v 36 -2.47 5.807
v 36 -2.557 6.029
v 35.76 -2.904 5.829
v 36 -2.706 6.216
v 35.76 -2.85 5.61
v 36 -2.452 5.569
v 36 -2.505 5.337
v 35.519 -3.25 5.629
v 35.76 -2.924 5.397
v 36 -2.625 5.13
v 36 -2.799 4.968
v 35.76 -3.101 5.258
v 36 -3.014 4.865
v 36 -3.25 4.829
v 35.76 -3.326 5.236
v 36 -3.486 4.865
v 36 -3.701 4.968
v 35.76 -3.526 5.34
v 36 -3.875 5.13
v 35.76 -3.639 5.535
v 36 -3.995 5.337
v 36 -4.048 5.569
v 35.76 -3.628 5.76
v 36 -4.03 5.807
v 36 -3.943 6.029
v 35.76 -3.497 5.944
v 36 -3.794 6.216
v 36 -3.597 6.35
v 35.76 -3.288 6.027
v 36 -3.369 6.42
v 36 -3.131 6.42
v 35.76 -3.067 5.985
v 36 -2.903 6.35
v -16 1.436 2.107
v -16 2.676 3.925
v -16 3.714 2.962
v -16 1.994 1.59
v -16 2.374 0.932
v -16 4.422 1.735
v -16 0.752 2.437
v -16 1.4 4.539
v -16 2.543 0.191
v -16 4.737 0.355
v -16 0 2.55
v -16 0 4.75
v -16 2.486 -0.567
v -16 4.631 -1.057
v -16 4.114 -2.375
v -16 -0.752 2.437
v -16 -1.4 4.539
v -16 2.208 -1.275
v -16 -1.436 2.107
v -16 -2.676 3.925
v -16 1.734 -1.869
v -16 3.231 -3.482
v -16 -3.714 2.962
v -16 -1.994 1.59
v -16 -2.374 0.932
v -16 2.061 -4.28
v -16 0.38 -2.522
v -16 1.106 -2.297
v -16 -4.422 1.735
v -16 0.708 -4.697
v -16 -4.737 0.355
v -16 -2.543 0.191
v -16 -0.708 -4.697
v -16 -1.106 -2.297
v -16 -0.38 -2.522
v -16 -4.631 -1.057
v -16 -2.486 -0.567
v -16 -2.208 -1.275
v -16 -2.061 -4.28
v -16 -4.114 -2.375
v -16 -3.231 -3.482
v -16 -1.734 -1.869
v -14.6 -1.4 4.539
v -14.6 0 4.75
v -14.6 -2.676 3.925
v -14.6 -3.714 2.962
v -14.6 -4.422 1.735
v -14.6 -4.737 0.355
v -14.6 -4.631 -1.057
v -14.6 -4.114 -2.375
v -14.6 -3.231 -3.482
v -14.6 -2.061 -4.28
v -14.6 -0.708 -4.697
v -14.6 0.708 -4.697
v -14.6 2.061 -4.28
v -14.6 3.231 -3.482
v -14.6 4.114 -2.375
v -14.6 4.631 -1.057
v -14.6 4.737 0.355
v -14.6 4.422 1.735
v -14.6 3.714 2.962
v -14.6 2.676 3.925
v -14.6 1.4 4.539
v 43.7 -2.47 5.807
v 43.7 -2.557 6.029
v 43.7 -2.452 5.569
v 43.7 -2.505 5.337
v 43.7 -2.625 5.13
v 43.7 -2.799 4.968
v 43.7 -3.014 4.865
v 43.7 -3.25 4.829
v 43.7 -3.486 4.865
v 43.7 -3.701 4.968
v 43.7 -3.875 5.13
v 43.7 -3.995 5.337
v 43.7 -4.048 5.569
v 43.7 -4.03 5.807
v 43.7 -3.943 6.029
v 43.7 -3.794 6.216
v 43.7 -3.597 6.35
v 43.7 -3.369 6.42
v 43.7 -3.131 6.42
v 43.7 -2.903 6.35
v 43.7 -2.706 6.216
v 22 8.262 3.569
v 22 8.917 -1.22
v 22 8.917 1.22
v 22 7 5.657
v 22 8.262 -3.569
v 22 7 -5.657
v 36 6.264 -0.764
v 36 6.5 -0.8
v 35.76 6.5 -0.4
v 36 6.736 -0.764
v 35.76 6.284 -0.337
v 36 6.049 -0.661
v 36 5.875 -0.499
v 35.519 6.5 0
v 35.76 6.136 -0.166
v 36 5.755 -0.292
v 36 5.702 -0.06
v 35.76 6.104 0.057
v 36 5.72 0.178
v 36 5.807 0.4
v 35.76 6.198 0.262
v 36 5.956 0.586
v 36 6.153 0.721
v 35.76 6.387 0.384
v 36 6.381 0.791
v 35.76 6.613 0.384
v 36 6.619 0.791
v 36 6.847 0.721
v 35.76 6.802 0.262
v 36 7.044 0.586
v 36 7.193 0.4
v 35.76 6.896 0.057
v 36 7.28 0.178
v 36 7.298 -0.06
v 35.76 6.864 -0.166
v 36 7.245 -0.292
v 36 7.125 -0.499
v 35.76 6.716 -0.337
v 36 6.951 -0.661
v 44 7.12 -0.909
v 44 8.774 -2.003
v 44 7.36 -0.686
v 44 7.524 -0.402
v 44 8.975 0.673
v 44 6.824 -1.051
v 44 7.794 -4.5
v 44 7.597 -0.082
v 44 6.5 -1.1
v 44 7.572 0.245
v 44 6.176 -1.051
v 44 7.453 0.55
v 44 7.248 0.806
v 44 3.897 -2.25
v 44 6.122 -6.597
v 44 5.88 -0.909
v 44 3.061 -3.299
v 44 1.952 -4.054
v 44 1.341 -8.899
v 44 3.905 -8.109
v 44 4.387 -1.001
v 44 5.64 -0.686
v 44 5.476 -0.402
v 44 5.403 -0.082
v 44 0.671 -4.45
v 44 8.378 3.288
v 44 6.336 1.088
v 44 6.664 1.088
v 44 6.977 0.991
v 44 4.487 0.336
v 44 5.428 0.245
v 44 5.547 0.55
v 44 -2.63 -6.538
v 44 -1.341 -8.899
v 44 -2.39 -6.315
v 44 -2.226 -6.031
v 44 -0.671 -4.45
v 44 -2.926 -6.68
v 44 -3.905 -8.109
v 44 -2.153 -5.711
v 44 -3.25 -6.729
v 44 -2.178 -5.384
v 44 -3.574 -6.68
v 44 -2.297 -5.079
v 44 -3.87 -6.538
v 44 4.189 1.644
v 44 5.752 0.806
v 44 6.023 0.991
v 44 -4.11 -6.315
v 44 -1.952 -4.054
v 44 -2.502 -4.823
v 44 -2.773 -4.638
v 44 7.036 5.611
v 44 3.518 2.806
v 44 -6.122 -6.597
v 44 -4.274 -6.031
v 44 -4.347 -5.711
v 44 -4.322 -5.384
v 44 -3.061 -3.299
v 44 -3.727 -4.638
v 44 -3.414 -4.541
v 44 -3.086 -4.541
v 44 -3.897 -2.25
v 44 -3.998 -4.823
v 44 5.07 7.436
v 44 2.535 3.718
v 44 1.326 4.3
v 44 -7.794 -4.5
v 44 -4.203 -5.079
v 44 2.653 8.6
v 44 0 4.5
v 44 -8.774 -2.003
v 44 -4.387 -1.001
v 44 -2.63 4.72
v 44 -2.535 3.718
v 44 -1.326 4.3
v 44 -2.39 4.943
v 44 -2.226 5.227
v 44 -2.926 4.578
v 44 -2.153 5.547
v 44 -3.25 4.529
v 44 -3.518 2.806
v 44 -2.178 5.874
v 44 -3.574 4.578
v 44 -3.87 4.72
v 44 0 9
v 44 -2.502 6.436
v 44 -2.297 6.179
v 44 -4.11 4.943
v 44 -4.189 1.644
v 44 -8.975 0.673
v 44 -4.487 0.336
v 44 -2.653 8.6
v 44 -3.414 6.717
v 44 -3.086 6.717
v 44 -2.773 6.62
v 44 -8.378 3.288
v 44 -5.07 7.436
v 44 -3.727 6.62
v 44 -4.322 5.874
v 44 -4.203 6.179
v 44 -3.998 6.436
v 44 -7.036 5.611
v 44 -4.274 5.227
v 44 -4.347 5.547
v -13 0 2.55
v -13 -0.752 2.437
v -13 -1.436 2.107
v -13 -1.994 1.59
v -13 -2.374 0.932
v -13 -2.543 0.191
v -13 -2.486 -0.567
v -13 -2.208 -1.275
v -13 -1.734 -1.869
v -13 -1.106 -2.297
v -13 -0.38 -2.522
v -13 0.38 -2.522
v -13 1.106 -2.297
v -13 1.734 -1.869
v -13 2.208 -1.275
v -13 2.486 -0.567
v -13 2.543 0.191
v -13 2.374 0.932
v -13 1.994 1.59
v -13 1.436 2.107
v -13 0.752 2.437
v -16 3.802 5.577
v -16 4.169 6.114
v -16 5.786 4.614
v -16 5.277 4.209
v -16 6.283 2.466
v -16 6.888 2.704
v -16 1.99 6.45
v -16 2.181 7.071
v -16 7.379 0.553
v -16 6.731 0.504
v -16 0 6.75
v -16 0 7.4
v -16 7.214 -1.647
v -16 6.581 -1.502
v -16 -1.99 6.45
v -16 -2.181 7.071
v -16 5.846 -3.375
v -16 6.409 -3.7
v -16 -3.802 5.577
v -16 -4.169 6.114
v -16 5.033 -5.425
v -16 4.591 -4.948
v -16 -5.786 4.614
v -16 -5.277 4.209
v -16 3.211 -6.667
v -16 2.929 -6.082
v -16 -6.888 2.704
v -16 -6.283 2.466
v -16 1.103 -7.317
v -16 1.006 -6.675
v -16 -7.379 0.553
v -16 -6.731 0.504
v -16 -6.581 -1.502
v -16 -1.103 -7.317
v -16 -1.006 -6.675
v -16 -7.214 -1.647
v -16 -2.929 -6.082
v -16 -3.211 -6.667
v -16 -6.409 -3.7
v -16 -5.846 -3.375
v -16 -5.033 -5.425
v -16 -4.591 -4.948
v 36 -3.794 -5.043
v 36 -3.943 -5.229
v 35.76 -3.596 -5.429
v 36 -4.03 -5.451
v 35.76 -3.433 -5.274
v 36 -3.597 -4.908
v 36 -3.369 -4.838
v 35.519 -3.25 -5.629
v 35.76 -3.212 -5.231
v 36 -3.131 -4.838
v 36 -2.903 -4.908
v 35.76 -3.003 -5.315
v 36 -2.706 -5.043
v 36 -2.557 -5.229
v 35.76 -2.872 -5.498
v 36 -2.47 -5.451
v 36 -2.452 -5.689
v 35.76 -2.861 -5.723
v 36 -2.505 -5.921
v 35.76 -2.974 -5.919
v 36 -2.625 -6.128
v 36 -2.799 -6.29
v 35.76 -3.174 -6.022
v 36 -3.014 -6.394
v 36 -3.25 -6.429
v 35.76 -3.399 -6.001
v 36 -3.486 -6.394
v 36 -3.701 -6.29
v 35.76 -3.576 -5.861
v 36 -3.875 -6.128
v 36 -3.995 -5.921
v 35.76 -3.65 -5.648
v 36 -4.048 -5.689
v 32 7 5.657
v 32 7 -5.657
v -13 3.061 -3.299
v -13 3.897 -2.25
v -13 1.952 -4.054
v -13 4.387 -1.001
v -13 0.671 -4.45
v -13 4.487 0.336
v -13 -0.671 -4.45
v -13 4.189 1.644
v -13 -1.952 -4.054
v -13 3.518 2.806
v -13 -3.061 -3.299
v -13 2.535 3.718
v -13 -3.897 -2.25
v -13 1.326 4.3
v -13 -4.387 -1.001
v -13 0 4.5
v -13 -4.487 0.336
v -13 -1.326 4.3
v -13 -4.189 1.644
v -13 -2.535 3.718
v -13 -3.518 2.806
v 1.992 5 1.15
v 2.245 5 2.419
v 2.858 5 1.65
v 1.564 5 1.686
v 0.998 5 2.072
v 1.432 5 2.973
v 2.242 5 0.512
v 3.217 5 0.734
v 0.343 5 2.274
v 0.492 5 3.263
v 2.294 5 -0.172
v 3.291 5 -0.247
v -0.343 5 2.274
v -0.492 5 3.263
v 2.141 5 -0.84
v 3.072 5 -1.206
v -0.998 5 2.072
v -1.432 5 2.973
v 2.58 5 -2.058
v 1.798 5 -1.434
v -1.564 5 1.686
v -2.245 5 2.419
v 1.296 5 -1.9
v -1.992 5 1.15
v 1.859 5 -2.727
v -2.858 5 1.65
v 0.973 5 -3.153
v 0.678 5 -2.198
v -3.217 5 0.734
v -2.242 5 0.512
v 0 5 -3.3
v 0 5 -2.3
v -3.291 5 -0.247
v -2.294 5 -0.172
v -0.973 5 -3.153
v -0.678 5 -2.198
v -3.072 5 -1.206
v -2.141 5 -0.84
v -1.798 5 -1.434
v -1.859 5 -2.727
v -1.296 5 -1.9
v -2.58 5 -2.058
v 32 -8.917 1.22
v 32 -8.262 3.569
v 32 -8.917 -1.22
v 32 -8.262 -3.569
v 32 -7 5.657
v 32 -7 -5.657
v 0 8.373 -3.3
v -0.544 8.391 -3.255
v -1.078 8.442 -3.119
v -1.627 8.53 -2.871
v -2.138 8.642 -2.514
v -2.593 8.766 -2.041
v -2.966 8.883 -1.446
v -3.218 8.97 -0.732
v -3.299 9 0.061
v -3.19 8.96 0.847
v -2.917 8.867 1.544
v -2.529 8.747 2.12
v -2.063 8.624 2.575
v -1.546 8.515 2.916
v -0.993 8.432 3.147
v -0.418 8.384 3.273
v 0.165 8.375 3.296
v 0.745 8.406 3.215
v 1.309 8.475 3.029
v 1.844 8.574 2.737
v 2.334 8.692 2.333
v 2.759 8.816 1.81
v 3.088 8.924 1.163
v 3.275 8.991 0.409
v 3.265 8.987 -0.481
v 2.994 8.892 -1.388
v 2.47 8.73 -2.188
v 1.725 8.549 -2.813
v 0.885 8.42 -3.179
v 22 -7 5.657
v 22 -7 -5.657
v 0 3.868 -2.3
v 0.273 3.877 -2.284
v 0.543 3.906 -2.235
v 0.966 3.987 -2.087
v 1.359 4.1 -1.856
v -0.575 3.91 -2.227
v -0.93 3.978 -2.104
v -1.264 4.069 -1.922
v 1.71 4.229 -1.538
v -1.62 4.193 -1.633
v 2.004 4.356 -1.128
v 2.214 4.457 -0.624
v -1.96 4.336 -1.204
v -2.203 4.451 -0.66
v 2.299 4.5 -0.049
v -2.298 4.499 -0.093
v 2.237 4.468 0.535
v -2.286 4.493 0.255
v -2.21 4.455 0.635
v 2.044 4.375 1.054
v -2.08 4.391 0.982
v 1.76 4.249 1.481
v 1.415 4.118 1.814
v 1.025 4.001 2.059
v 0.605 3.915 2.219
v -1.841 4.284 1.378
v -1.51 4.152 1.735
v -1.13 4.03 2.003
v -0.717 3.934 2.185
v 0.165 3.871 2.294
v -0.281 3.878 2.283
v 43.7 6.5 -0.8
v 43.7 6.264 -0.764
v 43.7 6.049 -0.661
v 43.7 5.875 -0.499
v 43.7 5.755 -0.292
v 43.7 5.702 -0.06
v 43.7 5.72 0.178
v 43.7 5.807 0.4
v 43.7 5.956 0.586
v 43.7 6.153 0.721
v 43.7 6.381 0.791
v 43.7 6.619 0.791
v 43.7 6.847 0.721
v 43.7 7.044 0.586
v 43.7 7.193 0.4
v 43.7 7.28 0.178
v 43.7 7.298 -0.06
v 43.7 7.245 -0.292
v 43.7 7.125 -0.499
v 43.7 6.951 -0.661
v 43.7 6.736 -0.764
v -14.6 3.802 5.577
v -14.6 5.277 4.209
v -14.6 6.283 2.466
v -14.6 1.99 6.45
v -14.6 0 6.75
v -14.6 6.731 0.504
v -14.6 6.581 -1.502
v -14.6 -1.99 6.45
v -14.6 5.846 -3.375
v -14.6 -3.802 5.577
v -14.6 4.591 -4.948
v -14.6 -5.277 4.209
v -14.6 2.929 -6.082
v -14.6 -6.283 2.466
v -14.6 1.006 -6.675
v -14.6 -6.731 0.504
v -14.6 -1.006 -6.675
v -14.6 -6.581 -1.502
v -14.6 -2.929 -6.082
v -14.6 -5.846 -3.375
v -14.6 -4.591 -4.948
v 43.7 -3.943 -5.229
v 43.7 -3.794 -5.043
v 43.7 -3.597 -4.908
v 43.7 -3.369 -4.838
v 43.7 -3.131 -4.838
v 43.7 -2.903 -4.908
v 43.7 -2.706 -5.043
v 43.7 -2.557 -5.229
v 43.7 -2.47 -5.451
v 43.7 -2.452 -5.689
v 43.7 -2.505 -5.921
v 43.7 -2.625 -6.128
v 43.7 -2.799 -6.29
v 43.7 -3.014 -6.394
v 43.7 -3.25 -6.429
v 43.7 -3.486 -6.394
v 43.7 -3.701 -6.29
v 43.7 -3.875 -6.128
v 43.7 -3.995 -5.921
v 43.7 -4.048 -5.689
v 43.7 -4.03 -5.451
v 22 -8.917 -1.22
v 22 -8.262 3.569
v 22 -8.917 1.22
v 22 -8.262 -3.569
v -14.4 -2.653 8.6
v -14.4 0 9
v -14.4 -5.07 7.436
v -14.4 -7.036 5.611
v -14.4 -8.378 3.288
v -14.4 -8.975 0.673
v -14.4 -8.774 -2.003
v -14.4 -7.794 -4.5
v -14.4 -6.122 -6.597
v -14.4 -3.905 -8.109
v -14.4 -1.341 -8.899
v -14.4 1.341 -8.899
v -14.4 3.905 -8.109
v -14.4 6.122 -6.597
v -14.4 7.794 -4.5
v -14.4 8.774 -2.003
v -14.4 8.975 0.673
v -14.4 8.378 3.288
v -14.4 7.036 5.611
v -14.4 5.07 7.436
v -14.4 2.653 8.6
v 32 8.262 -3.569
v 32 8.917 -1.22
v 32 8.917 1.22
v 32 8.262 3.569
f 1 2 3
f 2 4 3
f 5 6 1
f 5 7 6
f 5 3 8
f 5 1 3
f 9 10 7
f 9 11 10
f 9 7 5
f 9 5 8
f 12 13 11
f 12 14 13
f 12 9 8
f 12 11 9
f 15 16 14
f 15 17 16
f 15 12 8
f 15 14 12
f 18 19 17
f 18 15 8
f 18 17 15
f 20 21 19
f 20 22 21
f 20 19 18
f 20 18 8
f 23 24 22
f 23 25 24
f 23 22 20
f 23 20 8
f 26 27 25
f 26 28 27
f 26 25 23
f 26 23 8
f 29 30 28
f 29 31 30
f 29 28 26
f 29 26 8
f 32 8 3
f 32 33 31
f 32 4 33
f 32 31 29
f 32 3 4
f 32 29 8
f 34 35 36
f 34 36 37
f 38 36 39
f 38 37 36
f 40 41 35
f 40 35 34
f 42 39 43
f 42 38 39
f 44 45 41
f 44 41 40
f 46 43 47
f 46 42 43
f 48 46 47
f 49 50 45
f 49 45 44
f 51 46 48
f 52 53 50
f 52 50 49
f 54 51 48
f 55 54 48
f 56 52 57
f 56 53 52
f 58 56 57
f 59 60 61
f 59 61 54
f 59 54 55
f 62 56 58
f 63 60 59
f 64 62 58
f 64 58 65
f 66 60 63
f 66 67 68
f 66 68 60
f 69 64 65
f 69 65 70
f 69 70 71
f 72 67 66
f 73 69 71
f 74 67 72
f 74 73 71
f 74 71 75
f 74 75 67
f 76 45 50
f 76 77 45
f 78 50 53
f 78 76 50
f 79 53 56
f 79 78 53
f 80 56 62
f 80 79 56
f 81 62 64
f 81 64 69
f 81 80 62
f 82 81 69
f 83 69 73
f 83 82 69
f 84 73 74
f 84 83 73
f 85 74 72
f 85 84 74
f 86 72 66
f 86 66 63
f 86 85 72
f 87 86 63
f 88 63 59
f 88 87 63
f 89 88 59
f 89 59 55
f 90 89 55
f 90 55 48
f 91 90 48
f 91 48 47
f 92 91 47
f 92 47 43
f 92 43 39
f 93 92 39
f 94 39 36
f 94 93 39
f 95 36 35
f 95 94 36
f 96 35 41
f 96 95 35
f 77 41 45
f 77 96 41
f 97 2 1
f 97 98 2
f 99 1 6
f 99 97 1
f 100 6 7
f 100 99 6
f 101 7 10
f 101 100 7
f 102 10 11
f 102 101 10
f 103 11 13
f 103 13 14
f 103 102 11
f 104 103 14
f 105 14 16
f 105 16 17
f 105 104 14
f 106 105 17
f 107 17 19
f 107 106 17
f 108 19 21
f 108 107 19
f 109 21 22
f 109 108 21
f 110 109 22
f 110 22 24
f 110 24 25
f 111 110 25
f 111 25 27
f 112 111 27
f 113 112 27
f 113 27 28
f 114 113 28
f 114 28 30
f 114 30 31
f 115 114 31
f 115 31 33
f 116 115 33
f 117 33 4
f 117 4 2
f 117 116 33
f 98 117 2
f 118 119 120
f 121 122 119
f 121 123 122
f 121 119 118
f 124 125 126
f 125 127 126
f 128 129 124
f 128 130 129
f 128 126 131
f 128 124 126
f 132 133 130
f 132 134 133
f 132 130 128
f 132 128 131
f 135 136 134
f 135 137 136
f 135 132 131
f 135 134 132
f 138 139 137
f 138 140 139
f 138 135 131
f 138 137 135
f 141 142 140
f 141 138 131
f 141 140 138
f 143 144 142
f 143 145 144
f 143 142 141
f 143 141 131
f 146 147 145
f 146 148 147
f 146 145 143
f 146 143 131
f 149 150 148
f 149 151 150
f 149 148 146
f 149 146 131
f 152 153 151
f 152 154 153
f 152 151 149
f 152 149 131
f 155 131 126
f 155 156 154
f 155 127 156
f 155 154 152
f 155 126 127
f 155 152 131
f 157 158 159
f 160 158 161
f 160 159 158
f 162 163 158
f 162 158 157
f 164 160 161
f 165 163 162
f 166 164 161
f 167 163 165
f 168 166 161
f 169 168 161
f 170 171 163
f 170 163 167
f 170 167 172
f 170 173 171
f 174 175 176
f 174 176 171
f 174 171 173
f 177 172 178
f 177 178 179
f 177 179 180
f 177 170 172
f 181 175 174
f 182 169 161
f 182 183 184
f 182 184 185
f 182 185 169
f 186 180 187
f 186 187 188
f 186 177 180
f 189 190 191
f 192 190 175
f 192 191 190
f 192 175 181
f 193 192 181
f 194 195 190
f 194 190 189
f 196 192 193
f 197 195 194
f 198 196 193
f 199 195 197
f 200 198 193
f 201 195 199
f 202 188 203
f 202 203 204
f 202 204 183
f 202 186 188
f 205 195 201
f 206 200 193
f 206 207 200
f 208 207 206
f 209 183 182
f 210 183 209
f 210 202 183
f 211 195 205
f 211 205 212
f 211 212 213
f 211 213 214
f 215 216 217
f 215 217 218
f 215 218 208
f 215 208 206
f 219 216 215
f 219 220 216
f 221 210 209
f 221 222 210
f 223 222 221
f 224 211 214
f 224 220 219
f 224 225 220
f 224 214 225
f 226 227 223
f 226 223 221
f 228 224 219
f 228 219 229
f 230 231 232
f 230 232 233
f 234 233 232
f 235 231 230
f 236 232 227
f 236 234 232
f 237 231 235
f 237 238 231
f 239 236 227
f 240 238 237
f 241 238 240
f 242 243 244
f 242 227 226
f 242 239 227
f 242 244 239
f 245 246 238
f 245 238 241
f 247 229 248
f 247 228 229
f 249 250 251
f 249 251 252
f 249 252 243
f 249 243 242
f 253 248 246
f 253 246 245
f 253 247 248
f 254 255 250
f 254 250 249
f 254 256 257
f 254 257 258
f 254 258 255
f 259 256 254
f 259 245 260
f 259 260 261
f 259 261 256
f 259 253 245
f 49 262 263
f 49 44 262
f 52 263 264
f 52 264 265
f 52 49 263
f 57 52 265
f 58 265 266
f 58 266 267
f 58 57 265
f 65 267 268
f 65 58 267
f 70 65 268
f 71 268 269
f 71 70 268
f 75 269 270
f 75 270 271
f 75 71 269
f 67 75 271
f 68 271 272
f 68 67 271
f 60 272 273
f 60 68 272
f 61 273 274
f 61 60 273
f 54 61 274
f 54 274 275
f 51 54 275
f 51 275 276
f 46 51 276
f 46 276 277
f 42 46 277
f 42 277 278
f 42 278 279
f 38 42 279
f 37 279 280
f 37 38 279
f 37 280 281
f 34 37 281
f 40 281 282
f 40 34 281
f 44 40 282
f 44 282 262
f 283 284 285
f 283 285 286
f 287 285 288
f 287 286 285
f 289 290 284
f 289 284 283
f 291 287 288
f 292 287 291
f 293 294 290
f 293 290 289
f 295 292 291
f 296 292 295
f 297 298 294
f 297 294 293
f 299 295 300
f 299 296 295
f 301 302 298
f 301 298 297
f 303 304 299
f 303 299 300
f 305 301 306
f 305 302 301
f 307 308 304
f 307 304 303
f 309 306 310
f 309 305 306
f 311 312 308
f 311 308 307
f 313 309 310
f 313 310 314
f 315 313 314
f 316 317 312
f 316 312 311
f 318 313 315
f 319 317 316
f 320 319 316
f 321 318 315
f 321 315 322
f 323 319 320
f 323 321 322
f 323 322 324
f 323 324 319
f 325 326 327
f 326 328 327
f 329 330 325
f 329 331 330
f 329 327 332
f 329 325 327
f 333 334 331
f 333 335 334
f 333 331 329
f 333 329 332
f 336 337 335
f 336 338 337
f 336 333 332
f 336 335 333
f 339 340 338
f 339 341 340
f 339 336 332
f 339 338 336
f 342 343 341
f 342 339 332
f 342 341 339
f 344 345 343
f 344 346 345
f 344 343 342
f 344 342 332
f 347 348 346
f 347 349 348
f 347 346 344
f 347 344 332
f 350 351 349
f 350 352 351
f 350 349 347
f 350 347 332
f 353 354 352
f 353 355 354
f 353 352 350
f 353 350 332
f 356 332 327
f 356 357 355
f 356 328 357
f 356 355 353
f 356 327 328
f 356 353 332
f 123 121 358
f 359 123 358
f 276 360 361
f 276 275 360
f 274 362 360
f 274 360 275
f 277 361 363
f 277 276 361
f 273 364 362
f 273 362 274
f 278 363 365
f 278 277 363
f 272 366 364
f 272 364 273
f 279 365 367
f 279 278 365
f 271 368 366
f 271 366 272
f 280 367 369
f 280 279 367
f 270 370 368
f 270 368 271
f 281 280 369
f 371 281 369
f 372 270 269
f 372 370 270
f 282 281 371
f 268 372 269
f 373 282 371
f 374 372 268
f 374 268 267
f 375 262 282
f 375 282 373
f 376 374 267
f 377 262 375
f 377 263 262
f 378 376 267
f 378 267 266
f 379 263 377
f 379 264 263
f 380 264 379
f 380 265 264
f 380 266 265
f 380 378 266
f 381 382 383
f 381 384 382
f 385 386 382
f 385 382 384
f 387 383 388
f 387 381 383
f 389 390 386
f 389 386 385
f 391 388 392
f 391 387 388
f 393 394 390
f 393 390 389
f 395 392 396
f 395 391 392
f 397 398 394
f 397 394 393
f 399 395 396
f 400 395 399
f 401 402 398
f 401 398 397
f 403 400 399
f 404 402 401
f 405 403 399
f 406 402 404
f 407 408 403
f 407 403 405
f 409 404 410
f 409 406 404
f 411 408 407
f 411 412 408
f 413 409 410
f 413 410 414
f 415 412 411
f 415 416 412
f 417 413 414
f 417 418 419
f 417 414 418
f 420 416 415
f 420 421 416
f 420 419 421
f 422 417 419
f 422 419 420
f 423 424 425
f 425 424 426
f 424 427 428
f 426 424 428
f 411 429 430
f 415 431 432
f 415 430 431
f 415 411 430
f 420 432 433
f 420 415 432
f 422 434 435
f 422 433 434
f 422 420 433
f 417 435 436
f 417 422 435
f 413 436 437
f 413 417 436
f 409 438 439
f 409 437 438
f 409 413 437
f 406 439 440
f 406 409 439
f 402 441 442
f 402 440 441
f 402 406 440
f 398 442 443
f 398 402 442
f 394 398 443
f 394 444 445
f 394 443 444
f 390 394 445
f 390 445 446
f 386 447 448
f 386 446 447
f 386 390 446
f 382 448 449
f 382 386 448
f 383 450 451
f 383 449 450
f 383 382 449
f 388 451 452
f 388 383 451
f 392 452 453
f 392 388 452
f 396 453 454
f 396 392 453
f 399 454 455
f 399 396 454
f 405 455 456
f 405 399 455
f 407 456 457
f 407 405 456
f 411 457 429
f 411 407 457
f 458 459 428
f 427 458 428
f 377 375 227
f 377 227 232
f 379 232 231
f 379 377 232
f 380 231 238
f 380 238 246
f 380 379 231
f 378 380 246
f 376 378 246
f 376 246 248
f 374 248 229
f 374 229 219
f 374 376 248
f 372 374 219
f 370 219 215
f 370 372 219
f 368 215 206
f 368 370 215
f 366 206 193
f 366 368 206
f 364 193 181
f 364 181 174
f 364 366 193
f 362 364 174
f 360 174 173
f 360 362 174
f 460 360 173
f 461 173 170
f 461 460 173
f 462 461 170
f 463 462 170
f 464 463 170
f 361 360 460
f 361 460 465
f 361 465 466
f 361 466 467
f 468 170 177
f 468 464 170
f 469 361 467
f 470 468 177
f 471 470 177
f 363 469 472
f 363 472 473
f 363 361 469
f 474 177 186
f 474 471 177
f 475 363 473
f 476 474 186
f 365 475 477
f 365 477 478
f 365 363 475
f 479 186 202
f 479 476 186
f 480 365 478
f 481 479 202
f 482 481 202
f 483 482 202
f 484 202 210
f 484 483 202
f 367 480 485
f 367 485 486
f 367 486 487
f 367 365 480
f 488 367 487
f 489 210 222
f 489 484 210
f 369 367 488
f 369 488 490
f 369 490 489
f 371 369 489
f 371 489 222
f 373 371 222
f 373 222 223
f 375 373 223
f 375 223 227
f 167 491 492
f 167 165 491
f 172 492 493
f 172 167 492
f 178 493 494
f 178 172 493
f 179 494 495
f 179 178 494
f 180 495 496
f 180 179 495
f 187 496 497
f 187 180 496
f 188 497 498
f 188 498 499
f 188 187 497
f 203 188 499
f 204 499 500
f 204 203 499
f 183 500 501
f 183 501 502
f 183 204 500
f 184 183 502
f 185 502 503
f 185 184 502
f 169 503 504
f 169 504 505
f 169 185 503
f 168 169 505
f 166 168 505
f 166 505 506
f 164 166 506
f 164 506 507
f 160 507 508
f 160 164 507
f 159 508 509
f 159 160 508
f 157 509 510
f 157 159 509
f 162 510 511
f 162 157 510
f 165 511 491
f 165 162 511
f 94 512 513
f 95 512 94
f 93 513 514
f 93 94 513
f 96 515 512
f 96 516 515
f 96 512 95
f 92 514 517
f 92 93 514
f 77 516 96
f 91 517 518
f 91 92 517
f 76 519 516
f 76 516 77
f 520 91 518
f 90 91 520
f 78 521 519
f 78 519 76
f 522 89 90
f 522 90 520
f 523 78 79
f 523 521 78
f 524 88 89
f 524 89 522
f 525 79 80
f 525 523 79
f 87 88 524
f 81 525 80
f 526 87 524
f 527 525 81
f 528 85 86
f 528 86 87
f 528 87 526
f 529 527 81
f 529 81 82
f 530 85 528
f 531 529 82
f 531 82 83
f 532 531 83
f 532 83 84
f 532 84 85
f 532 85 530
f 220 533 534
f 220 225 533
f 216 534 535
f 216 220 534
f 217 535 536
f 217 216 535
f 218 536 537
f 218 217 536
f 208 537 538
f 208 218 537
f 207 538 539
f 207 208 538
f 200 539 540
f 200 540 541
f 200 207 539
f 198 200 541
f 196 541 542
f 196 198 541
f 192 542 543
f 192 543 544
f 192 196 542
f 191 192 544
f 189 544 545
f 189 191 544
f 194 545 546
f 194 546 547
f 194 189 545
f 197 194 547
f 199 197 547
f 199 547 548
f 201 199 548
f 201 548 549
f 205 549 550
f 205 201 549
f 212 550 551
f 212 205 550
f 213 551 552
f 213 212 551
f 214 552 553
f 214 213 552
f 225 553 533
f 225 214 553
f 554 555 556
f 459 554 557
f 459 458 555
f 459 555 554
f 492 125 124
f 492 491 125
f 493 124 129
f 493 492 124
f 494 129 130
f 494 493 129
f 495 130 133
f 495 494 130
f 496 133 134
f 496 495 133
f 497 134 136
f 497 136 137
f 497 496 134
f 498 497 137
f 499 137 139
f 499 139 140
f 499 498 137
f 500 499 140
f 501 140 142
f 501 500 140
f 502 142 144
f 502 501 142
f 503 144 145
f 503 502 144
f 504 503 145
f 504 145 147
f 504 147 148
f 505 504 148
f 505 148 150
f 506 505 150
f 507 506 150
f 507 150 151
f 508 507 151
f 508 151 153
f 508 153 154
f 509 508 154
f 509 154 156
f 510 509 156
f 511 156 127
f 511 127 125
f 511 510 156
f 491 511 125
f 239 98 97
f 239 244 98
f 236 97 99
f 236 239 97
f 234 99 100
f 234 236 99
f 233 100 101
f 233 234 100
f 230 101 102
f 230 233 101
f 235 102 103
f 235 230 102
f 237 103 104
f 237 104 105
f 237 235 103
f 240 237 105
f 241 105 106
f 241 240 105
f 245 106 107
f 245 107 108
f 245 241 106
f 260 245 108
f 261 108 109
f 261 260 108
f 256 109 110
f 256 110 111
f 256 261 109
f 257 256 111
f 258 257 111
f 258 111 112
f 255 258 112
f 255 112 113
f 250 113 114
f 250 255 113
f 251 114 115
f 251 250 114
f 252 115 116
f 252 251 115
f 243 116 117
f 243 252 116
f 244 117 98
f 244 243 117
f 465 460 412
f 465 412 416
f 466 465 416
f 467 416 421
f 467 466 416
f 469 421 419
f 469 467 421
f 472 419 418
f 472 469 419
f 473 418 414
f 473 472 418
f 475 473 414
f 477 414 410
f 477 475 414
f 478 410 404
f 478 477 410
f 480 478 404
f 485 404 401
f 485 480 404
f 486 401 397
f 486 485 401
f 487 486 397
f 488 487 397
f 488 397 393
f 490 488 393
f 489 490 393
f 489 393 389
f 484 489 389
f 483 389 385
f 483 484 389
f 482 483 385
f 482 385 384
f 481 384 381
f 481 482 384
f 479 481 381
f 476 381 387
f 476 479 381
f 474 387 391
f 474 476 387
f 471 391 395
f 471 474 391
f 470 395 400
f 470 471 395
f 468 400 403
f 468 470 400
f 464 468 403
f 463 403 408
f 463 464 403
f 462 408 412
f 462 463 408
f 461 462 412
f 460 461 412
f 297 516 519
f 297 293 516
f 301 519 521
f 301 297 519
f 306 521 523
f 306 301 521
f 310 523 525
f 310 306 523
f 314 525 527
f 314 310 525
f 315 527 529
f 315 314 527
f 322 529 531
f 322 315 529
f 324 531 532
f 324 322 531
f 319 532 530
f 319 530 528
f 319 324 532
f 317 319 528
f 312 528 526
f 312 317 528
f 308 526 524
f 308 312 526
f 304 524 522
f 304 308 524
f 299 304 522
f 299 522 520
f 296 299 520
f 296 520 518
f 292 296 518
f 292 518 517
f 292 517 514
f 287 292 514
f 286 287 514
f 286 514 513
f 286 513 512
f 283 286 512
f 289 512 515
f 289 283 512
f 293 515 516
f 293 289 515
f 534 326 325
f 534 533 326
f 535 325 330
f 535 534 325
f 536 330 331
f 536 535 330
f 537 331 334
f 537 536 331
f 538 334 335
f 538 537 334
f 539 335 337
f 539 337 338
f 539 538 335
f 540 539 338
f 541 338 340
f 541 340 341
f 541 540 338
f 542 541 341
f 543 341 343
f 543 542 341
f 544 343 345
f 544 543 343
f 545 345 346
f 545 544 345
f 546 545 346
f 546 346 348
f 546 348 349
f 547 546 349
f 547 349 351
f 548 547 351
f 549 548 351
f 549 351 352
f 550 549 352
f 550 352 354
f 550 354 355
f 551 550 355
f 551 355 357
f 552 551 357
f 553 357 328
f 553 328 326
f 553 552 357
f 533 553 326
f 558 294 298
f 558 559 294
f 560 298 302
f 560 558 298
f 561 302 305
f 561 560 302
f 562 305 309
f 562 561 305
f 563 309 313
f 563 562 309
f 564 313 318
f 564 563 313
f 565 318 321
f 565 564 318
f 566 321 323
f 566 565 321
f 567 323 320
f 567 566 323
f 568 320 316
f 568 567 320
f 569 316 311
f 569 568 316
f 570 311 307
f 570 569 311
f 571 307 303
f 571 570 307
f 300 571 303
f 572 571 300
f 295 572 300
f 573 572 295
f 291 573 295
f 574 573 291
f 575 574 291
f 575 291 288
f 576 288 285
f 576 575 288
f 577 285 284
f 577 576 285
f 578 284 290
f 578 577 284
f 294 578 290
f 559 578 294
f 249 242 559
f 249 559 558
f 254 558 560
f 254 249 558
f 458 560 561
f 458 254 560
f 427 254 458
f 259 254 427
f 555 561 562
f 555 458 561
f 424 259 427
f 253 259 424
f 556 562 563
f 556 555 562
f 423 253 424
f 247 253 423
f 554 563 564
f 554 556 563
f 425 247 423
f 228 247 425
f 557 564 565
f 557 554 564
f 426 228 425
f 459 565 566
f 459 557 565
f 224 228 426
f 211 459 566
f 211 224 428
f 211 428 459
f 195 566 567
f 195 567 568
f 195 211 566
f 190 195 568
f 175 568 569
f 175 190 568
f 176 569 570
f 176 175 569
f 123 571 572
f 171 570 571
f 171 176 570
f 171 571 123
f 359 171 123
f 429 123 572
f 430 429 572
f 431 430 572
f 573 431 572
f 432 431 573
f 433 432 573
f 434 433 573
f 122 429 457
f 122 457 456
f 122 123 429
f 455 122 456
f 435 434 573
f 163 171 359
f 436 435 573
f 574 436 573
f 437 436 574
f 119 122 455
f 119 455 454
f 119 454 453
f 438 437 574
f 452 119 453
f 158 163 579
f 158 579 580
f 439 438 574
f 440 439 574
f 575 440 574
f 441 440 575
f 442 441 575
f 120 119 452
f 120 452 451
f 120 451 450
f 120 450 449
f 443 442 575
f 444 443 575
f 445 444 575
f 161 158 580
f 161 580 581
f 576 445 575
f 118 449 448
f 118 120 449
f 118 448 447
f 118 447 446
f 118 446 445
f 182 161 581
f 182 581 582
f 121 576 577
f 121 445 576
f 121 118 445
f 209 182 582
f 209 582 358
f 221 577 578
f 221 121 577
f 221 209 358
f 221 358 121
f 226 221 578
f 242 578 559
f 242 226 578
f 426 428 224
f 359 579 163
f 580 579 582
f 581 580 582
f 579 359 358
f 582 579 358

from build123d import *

# Parameters (mm, degrees)
SKETCH_3_W               = 10
SKETCH_3_H               = 2
CUT_EXTRUDE_1_DEPTH      = 46.803930098
PATTERN_CIRCULAR_1_COUNT = 2
PATTERN_CIRCULAR_2_COUNT = 3


with BuildPart() as part:
    # Эскиз1 → Повернуть1 (revolve)
    with BuildSketch(Plane.XY, mode=Mode.PRIVATE) as revolve_1_sk:
        Polygon((-16, 2.55), (-16, 4.75), (-14.6, 4.75), (-14.6, 6.75), (-16, 6.75), (-16, 7.4), (-14.4, 9), (44, 9), (44, 4.5), (-13, 4.5), (-13, 2.55), align=None)
    revolve(revolve_1_sk.sketch.rotate(Axis((-16, 0, 0), (1, 0, 0)), 90), axis=Axis((-16, 0, 0), (1, 0, 0)))

    # Эскиз2 → Вырез-Повернуть1 (revolve, cut)
    with BuildSketch(Plane.XY, mode=Mode.PRIVATE) as cut_revolve_1_sk:
        Polygon((0, 0), (0, 9), (3.3, 9), (3.3, 5), (2.3, 5), (2.3, 0), align=None)
    revolve(cut_revolve_1_sk.sketch.rotate(Axis((0, 0, 0), (0, 1, 0)), 90), axis=Axis((0, 0, 0), (0, 1, 0)), mode=Mode.SUBTRACT)

    # Эскиз3 → Вырез-Вытянуть1 (cut, symmetric)
    with BuildSketch(Plane.XY):
        with Locations((27, 8)):
            Rectangle(SKETCH_3_W, SKETCH_3_H)
    cut_extrude_1 = extrude(amount=CUT_EXTRUDE_1_DEPTH, both=True, mode=Mode.SUBTRACT)

    # Эскиз5 → Отверстие обработанное метчиком M21 (revolve, cut)
    with BuildSketch(Plane(origin=(44, 6.5, 0), x_dir=(0, 0, -1), z_dir=(0, 1, 0))):
        Polygon((0, 0), (0, 8.480688495), (0.8, 8), (0.8, 0.3), (1.1, 0), align=None)
    hole_wizard_m21 = revolve(axis=Axis((50.35, 6.5, 0), (-1, 0, 0)), mode=Mode.SUBTRACT)

    # Круговой массив1: Вырез-Вытянуть1 ×2 about axis
    pattern_circular_1_axis = Axis((-41.040855915, 0, 0), (1, 0, 0))
    for i in range(1, PATTERN_CIRCULAR_1_COUNT):
        add(cut_extrude_1.rotate(pattern_circular_1_axis, i * 360 / PATTERN_CIRCULAR_1_COUNT), mode=Mode.SUBTRACT)

    # Круговой массив2: Отверстие обработанное метчиком M21 ×3 about axis
    pattern_circular_2_axis = Axis((0, 0, 0), (1, 0, 0))
    for i in range(1, PATTERN_CIRCULAR_2_COUNT):
        add(hole_wizard_m21.rotate(pattern_circular_2_axis, i * 360 / PATTERN_CIRCULAR_2_COUNT), mode=Mode.SUBTRACT)


solid = part.part
